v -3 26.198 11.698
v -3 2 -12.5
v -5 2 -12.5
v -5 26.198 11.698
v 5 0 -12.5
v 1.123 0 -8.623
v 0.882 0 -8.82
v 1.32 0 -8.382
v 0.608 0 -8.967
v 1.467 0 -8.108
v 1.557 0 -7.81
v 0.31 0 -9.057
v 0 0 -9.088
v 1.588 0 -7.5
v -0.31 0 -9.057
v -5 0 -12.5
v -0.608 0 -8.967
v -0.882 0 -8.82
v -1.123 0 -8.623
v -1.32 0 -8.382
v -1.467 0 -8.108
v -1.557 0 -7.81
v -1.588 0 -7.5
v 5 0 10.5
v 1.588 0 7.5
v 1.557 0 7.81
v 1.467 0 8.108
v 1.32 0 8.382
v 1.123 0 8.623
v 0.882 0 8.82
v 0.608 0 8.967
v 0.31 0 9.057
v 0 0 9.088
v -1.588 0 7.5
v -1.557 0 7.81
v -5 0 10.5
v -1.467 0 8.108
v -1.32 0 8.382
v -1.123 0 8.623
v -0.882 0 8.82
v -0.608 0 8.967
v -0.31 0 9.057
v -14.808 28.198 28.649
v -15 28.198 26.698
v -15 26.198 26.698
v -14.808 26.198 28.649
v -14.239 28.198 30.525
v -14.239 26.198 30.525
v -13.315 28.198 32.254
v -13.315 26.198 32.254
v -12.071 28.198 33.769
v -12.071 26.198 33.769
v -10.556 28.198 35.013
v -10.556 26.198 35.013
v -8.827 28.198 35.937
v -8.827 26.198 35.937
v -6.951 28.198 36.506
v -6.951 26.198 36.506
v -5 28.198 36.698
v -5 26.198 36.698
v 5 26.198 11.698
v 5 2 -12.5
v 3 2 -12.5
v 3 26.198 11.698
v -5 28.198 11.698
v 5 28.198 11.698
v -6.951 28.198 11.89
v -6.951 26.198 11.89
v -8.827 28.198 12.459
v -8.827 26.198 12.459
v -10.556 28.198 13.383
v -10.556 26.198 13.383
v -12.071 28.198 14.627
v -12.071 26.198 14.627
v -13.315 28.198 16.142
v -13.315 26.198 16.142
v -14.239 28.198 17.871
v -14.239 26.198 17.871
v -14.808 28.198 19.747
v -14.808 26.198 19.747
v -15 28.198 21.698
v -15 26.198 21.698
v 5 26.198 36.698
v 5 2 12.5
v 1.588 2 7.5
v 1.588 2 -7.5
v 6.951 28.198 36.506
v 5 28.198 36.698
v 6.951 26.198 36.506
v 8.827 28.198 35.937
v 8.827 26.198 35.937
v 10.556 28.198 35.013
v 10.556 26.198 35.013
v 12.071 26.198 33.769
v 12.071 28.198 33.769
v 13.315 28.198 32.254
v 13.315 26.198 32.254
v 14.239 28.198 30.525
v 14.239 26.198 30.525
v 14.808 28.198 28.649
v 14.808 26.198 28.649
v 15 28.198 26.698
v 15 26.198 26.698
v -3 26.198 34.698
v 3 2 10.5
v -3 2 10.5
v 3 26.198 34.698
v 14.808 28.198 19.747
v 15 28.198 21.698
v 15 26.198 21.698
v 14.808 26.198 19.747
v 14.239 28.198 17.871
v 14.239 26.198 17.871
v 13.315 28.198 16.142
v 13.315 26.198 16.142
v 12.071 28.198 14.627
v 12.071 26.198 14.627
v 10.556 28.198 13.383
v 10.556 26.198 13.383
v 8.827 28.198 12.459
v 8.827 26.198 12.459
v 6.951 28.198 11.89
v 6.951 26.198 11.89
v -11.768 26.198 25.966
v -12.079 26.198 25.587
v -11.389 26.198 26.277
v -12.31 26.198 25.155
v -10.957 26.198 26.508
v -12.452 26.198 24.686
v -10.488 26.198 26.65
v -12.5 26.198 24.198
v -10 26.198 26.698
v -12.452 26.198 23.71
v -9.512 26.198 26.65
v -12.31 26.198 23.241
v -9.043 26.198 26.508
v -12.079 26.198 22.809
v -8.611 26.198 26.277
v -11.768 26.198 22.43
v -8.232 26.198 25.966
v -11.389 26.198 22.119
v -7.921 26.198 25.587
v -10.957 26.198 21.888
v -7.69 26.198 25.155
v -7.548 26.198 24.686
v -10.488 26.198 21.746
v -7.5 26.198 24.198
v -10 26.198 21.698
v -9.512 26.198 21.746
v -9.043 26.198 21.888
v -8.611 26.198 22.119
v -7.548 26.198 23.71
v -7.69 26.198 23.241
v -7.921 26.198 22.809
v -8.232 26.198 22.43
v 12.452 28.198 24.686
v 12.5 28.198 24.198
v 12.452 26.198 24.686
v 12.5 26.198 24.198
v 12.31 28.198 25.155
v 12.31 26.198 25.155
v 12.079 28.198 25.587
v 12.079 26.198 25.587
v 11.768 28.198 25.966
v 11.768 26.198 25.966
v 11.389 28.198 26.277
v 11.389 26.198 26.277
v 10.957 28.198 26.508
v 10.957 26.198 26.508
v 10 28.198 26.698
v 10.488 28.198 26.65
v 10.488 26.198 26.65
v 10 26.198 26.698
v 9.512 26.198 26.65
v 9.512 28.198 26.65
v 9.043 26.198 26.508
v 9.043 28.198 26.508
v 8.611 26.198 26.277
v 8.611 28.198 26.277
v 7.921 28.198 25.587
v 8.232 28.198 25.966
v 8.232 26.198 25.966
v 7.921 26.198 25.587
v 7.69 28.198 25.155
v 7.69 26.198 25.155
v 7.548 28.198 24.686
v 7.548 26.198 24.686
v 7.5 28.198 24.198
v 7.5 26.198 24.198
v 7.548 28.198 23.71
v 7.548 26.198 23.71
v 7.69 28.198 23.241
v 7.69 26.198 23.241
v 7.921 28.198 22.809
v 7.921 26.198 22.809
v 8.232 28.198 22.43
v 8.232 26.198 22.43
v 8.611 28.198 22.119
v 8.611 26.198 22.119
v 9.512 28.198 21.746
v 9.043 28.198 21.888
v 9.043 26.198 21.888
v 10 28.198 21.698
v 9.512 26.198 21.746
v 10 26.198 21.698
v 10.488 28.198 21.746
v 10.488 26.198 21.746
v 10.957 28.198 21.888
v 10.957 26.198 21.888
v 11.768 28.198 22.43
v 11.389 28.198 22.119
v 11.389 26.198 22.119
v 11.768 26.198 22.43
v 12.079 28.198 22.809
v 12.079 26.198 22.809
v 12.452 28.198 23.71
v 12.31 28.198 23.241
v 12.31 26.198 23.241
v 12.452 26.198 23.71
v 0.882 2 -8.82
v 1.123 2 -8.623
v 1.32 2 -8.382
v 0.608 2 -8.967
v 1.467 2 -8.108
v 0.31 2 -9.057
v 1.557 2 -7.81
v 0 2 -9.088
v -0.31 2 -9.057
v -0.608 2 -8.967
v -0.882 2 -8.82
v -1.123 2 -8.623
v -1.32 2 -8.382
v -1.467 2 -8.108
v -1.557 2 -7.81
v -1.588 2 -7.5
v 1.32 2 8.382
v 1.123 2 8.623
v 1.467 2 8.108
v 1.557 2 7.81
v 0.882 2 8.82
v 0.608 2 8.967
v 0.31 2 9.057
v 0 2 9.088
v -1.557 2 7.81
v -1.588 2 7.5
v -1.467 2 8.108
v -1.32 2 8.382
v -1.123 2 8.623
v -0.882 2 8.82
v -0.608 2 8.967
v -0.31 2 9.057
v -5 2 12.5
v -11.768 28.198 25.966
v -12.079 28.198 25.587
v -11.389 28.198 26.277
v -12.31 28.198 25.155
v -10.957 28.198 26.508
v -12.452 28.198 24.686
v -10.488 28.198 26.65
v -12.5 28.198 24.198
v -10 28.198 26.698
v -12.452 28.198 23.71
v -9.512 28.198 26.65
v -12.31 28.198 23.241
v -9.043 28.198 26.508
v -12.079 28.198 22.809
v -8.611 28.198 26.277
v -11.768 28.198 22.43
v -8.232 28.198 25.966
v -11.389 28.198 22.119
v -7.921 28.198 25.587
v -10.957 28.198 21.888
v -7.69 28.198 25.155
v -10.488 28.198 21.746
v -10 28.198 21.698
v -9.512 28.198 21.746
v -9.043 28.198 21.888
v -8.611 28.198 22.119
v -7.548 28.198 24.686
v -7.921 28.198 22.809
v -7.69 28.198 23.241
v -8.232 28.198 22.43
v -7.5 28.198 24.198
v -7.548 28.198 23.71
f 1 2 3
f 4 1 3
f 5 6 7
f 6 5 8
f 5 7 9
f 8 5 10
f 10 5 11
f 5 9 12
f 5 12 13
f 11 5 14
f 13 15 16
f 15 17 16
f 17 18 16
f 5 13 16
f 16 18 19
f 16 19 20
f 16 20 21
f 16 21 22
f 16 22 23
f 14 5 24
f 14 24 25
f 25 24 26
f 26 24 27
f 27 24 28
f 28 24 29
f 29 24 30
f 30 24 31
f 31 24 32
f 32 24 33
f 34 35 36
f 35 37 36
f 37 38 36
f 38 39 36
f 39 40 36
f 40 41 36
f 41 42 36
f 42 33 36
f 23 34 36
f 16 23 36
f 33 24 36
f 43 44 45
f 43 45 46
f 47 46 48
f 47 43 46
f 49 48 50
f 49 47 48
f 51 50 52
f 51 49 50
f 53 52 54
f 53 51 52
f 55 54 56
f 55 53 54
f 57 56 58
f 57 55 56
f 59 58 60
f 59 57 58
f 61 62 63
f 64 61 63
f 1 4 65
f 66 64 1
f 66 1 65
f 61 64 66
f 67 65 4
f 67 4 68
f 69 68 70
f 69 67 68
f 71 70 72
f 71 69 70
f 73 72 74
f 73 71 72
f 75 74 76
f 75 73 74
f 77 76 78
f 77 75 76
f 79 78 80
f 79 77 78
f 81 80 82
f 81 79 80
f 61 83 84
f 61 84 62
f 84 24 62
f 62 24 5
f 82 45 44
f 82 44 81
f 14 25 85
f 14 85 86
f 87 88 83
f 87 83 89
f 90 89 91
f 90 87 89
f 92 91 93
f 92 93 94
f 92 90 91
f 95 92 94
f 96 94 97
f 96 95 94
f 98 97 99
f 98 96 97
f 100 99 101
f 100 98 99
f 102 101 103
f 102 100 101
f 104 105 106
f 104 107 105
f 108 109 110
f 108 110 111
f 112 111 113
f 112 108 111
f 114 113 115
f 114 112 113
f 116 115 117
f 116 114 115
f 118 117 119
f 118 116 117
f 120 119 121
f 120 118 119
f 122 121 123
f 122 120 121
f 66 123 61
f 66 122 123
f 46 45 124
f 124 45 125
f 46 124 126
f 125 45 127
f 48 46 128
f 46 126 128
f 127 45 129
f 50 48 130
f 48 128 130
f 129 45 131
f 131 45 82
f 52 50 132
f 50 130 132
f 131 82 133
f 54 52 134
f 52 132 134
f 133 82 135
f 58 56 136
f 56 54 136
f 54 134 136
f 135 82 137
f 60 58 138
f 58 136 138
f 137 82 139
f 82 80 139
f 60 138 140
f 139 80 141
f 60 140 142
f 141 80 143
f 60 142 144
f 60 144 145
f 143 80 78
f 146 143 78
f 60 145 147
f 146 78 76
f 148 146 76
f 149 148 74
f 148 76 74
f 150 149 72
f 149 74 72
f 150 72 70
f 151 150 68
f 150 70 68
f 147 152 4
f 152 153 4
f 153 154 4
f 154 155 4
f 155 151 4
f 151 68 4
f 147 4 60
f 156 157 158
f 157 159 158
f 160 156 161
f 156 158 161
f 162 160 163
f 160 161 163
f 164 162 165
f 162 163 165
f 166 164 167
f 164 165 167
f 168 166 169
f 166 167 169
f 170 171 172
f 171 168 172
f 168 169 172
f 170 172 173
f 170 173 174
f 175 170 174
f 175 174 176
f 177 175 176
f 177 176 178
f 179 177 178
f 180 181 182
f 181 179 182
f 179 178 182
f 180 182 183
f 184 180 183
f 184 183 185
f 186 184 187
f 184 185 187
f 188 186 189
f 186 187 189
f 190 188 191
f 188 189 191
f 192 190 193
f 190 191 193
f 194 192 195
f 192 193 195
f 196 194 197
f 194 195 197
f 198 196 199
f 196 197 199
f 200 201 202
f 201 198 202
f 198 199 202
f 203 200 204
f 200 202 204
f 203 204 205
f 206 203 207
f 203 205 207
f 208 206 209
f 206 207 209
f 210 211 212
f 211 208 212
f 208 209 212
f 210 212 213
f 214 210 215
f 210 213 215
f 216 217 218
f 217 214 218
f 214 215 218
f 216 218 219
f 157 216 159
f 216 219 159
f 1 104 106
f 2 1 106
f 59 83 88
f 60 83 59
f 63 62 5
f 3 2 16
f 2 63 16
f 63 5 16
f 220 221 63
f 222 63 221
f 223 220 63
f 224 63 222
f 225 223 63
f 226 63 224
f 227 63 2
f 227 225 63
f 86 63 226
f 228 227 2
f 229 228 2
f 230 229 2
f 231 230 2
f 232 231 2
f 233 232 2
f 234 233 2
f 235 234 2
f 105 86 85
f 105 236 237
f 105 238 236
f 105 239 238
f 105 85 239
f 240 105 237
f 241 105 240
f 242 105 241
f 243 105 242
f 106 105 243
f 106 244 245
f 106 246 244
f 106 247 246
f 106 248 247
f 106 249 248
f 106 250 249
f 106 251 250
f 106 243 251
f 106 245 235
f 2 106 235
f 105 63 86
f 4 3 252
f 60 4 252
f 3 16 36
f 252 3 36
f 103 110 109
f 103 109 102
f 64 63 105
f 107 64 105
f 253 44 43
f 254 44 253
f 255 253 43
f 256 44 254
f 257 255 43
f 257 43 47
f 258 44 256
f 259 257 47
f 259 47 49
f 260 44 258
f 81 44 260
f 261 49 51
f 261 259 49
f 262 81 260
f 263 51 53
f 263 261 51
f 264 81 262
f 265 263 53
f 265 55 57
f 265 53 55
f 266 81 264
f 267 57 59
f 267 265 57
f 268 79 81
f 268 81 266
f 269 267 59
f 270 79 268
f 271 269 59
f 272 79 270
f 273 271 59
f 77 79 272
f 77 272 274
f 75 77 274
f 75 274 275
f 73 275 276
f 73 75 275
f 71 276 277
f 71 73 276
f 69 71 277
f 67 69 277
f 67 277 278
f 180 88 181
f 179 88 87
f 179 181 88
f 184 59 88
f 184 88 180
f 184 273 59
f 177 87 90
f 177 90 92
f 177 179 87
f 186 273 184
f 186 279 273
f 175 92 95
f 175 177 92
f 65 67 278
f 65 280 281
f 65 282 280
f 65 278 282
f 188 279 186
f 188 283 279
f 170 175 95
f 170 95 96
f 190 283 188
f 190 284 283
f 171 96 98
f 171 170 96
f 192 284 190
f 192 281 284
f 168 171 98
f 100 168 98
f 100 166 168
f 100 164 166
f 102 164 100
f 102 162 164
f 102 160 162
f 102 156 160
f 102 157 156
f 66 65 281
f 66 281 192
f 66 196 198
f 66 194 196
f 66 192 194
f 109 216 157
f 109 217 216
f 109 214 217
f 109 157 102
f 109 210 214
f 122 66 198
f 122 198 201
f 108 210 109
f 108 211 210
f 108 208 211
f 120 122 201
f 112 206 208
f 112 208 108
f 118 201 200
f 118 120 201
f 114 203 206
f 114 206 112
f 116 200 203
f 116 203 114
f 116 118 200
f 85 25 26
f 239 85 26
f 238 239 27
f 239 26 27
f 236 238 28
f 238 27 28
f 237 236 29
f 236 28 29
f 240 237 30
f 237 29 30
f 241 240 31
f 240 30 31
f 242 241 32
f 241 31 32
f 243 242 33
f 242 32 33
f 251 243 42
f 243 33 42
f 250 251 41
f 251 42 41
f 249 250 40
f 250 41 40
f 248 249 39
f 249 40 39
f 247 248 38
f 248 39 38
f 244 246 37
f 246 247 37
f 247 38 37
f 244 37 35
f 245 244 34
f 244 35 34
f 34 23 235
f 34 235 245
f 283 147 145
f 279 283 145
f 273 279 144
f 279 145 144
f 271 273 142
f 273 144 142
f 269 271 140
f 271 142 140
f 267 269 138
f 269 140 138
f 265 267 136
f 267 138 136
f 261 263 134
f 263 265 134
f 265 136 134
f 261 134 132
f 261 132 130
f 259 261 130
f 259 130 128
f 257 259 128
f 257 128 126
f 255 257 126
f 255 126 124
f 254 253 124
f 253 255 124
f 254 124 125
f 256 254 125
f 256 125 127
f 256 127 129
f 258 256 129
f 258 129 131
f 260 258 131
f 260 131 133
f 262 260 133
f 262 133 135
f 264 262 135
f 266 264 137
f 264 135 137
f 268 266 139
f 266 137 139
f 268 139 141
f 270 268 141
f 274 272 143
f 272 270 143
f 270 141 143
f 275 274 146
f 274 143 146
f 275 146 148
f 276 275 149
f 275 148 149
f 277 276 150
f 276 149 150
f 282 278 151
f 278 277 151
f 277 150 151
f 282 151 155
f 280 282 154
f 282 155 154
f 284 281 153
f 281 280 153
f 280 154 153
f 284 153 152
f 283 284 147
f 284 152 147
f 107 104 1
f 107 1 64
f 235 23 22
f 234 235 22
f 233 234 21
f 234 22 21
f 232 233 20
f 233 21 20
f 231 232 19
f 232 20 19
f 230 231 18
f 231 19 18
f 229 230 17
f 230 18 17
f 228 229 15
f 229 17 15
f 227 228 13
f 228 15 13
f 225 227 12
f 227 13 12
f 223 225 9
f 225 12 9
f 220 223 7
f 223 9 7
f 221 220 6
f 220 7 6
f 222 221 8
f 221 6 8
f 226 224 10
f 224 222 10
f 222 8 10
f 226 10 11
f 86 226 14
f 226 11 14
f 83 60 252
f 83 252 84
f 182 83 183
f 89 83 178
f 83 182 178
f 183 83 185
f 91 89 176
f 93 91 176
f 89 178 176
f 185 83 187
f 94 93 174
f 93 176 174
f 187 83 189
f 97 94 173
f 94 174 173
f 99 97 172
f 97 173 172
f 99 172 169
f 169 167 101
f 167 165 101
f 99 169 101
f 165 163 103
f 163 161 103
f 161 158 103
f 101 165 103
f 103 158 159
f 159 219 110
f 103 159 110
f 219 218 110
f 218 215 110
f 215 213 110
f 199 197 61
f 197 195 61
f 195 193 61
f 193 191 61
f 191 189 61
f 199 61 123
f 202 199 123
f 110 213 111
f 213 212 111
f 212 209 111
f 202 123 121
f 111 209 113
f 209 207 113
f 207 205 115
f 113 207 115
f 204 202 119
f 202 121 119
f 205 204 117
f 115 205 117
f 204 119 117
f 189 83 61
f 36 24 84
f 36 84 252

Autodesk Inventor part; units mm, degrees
ref_plane "YZ Plane" through (0, 0, 0) normal (1, 0, 0) x (0, 1, 0)
ref_plane "XZ Plane" through (0, 0, 0) normal (0, 1, 0) x (-1, 0, 0)
ref_plane "XY Plane" through (0, 0, 0) normal (0, 0, 1) x (1, 0, 0)
sketch "Sketch1" plane through (0, 0, 0) normal (0, 1, 0) x (-1, 0, 0)
  line L0 (5, 12.5) -> (-5, 12.5)
  line L1 (-5, 12.5) -> (-5, -12.5)
  line L2 (-5, -12.5) -> (5, -12.5)
  line L3 (5, -12.5) -> (5, 12.5)
  line L4 (5, 12.5) -> (-5, -12.5) construction
  line L5 (-5, 12.5) -> (5, -12.5) construction
  line L6 (0, 7.5) -> (0, -7.5) construction
  line L7 (-1.5875, 7.5) -> (-1.5875, -7.5)
  line L8 (1.5875, -7.5) -> (1.5875, 7.5)
  arc A0 (1.5875, 7.5) -> (-1.5875, 7.5) centre (0, 7.5) ccw
  arc A1 (-1.5875, -7.5) -> (1.5875, -7.5) centre (0, -7.5) ccw
  point P0 (0, 0)
  point P1 (0, 0)
  dimension "d0" = 10
  dimension "d1" = 25
  dimension "d2" = 7.5
  dimension "d3" = 7.5
  dimension "d4" = 3.175
extrude "Extrusion1" add sketch "Sketch1" along normal blind 2
sketch "Sketch2" plane through (0, 2, 0) normal (0, 1, 0) x (1, 0, 0)
  line L0 (5, -12.5) -> (5, 12.5) projected
  line L1 (5, 12.5) -> (-5, 12.5) projected
  line L2 (-5, 12.5) -> (-5, -12.5) projected
  line L3 (-5, -12.5) -> (5, -12.5) projected
  arc A0 (-1.5875, -7.5) -> (1.5875, -7.5) centre (0, -7.5) ccw projected
  line L4 (-1.5875, -7.5) -> (-1.5875, 7.5) projected
  arc A1 (1.5875, 7.5) -> (-1.5875, 7.5) centre (0, 7.5) ccw projected
  line L5 (1.5875, 7.5) -> (1.5875, -7.5) projected
  line L6 (-3, -10.5) -> (-3, 10.5)
  line L7 (3, 10.5) -> (3, -10.5)
  line L8 (3, -10.5) -> (-3, -10.5)
  line L9 (-3, 10.5) -> (-3, 12.5)
  line L10 (3, 10.5) -> (3, 12.5)
  point P0 (0, 0)
  dimension "d7" = 2
sketch "Sketch3" plane through (0, 0, 0) normal (1, 0, 0) x (0, 1, 0)
  line L0 (2, 12.5) -> (26.198, 36.698)
  point P0 (0, 0)
  dimension "d15" = 34.2211
sweep "Sweep1" add profiles "Sketch2" path "Sketch3" contours L3 L2 L1 L9 L6 L8 L7 L10 L0
chamfer "Chamfer1" distance 2 angle 45 1 edges at (0, 0, 12.5)
sketch "Sketch5" plane through (-5, 26.198, 36.698) normal (0, 1, 0) x (1, 0, 0)
  line L0 (20, 0) -> (-10, 0)
  line L1 (-10, 0) -> (-10, 25)
  line L2 (-10, 25) -> (20, 25)
  line L3 (20, 25) -> (20, 0)
  line L4 (10, 0) -> (10, 25) projected
  circle A0 centre (15, 12.5) radius 2.5
  circle A1 centre (-5, 12.5) radius 2.5
  point P0 (5, 36.698)
  dimension "d23" = 25
  dimension "d24" = 30
  dimension "d25" = 10
  dimension "d26" = 5
  dimension "d27" = 5
  dimension "d28" = 5
  dimension "d29" = 5
extrude "Extrusion4" add sketch "Sketch5" along normal blind 2
fillet "Fillet1" radius 10 4 edges at (15, 27.198, 11.698) (-15, 27.198, 11.698) (-15, 27.198, 36.698) (15, 27.198, 36.698)
properties part number "ancla"
